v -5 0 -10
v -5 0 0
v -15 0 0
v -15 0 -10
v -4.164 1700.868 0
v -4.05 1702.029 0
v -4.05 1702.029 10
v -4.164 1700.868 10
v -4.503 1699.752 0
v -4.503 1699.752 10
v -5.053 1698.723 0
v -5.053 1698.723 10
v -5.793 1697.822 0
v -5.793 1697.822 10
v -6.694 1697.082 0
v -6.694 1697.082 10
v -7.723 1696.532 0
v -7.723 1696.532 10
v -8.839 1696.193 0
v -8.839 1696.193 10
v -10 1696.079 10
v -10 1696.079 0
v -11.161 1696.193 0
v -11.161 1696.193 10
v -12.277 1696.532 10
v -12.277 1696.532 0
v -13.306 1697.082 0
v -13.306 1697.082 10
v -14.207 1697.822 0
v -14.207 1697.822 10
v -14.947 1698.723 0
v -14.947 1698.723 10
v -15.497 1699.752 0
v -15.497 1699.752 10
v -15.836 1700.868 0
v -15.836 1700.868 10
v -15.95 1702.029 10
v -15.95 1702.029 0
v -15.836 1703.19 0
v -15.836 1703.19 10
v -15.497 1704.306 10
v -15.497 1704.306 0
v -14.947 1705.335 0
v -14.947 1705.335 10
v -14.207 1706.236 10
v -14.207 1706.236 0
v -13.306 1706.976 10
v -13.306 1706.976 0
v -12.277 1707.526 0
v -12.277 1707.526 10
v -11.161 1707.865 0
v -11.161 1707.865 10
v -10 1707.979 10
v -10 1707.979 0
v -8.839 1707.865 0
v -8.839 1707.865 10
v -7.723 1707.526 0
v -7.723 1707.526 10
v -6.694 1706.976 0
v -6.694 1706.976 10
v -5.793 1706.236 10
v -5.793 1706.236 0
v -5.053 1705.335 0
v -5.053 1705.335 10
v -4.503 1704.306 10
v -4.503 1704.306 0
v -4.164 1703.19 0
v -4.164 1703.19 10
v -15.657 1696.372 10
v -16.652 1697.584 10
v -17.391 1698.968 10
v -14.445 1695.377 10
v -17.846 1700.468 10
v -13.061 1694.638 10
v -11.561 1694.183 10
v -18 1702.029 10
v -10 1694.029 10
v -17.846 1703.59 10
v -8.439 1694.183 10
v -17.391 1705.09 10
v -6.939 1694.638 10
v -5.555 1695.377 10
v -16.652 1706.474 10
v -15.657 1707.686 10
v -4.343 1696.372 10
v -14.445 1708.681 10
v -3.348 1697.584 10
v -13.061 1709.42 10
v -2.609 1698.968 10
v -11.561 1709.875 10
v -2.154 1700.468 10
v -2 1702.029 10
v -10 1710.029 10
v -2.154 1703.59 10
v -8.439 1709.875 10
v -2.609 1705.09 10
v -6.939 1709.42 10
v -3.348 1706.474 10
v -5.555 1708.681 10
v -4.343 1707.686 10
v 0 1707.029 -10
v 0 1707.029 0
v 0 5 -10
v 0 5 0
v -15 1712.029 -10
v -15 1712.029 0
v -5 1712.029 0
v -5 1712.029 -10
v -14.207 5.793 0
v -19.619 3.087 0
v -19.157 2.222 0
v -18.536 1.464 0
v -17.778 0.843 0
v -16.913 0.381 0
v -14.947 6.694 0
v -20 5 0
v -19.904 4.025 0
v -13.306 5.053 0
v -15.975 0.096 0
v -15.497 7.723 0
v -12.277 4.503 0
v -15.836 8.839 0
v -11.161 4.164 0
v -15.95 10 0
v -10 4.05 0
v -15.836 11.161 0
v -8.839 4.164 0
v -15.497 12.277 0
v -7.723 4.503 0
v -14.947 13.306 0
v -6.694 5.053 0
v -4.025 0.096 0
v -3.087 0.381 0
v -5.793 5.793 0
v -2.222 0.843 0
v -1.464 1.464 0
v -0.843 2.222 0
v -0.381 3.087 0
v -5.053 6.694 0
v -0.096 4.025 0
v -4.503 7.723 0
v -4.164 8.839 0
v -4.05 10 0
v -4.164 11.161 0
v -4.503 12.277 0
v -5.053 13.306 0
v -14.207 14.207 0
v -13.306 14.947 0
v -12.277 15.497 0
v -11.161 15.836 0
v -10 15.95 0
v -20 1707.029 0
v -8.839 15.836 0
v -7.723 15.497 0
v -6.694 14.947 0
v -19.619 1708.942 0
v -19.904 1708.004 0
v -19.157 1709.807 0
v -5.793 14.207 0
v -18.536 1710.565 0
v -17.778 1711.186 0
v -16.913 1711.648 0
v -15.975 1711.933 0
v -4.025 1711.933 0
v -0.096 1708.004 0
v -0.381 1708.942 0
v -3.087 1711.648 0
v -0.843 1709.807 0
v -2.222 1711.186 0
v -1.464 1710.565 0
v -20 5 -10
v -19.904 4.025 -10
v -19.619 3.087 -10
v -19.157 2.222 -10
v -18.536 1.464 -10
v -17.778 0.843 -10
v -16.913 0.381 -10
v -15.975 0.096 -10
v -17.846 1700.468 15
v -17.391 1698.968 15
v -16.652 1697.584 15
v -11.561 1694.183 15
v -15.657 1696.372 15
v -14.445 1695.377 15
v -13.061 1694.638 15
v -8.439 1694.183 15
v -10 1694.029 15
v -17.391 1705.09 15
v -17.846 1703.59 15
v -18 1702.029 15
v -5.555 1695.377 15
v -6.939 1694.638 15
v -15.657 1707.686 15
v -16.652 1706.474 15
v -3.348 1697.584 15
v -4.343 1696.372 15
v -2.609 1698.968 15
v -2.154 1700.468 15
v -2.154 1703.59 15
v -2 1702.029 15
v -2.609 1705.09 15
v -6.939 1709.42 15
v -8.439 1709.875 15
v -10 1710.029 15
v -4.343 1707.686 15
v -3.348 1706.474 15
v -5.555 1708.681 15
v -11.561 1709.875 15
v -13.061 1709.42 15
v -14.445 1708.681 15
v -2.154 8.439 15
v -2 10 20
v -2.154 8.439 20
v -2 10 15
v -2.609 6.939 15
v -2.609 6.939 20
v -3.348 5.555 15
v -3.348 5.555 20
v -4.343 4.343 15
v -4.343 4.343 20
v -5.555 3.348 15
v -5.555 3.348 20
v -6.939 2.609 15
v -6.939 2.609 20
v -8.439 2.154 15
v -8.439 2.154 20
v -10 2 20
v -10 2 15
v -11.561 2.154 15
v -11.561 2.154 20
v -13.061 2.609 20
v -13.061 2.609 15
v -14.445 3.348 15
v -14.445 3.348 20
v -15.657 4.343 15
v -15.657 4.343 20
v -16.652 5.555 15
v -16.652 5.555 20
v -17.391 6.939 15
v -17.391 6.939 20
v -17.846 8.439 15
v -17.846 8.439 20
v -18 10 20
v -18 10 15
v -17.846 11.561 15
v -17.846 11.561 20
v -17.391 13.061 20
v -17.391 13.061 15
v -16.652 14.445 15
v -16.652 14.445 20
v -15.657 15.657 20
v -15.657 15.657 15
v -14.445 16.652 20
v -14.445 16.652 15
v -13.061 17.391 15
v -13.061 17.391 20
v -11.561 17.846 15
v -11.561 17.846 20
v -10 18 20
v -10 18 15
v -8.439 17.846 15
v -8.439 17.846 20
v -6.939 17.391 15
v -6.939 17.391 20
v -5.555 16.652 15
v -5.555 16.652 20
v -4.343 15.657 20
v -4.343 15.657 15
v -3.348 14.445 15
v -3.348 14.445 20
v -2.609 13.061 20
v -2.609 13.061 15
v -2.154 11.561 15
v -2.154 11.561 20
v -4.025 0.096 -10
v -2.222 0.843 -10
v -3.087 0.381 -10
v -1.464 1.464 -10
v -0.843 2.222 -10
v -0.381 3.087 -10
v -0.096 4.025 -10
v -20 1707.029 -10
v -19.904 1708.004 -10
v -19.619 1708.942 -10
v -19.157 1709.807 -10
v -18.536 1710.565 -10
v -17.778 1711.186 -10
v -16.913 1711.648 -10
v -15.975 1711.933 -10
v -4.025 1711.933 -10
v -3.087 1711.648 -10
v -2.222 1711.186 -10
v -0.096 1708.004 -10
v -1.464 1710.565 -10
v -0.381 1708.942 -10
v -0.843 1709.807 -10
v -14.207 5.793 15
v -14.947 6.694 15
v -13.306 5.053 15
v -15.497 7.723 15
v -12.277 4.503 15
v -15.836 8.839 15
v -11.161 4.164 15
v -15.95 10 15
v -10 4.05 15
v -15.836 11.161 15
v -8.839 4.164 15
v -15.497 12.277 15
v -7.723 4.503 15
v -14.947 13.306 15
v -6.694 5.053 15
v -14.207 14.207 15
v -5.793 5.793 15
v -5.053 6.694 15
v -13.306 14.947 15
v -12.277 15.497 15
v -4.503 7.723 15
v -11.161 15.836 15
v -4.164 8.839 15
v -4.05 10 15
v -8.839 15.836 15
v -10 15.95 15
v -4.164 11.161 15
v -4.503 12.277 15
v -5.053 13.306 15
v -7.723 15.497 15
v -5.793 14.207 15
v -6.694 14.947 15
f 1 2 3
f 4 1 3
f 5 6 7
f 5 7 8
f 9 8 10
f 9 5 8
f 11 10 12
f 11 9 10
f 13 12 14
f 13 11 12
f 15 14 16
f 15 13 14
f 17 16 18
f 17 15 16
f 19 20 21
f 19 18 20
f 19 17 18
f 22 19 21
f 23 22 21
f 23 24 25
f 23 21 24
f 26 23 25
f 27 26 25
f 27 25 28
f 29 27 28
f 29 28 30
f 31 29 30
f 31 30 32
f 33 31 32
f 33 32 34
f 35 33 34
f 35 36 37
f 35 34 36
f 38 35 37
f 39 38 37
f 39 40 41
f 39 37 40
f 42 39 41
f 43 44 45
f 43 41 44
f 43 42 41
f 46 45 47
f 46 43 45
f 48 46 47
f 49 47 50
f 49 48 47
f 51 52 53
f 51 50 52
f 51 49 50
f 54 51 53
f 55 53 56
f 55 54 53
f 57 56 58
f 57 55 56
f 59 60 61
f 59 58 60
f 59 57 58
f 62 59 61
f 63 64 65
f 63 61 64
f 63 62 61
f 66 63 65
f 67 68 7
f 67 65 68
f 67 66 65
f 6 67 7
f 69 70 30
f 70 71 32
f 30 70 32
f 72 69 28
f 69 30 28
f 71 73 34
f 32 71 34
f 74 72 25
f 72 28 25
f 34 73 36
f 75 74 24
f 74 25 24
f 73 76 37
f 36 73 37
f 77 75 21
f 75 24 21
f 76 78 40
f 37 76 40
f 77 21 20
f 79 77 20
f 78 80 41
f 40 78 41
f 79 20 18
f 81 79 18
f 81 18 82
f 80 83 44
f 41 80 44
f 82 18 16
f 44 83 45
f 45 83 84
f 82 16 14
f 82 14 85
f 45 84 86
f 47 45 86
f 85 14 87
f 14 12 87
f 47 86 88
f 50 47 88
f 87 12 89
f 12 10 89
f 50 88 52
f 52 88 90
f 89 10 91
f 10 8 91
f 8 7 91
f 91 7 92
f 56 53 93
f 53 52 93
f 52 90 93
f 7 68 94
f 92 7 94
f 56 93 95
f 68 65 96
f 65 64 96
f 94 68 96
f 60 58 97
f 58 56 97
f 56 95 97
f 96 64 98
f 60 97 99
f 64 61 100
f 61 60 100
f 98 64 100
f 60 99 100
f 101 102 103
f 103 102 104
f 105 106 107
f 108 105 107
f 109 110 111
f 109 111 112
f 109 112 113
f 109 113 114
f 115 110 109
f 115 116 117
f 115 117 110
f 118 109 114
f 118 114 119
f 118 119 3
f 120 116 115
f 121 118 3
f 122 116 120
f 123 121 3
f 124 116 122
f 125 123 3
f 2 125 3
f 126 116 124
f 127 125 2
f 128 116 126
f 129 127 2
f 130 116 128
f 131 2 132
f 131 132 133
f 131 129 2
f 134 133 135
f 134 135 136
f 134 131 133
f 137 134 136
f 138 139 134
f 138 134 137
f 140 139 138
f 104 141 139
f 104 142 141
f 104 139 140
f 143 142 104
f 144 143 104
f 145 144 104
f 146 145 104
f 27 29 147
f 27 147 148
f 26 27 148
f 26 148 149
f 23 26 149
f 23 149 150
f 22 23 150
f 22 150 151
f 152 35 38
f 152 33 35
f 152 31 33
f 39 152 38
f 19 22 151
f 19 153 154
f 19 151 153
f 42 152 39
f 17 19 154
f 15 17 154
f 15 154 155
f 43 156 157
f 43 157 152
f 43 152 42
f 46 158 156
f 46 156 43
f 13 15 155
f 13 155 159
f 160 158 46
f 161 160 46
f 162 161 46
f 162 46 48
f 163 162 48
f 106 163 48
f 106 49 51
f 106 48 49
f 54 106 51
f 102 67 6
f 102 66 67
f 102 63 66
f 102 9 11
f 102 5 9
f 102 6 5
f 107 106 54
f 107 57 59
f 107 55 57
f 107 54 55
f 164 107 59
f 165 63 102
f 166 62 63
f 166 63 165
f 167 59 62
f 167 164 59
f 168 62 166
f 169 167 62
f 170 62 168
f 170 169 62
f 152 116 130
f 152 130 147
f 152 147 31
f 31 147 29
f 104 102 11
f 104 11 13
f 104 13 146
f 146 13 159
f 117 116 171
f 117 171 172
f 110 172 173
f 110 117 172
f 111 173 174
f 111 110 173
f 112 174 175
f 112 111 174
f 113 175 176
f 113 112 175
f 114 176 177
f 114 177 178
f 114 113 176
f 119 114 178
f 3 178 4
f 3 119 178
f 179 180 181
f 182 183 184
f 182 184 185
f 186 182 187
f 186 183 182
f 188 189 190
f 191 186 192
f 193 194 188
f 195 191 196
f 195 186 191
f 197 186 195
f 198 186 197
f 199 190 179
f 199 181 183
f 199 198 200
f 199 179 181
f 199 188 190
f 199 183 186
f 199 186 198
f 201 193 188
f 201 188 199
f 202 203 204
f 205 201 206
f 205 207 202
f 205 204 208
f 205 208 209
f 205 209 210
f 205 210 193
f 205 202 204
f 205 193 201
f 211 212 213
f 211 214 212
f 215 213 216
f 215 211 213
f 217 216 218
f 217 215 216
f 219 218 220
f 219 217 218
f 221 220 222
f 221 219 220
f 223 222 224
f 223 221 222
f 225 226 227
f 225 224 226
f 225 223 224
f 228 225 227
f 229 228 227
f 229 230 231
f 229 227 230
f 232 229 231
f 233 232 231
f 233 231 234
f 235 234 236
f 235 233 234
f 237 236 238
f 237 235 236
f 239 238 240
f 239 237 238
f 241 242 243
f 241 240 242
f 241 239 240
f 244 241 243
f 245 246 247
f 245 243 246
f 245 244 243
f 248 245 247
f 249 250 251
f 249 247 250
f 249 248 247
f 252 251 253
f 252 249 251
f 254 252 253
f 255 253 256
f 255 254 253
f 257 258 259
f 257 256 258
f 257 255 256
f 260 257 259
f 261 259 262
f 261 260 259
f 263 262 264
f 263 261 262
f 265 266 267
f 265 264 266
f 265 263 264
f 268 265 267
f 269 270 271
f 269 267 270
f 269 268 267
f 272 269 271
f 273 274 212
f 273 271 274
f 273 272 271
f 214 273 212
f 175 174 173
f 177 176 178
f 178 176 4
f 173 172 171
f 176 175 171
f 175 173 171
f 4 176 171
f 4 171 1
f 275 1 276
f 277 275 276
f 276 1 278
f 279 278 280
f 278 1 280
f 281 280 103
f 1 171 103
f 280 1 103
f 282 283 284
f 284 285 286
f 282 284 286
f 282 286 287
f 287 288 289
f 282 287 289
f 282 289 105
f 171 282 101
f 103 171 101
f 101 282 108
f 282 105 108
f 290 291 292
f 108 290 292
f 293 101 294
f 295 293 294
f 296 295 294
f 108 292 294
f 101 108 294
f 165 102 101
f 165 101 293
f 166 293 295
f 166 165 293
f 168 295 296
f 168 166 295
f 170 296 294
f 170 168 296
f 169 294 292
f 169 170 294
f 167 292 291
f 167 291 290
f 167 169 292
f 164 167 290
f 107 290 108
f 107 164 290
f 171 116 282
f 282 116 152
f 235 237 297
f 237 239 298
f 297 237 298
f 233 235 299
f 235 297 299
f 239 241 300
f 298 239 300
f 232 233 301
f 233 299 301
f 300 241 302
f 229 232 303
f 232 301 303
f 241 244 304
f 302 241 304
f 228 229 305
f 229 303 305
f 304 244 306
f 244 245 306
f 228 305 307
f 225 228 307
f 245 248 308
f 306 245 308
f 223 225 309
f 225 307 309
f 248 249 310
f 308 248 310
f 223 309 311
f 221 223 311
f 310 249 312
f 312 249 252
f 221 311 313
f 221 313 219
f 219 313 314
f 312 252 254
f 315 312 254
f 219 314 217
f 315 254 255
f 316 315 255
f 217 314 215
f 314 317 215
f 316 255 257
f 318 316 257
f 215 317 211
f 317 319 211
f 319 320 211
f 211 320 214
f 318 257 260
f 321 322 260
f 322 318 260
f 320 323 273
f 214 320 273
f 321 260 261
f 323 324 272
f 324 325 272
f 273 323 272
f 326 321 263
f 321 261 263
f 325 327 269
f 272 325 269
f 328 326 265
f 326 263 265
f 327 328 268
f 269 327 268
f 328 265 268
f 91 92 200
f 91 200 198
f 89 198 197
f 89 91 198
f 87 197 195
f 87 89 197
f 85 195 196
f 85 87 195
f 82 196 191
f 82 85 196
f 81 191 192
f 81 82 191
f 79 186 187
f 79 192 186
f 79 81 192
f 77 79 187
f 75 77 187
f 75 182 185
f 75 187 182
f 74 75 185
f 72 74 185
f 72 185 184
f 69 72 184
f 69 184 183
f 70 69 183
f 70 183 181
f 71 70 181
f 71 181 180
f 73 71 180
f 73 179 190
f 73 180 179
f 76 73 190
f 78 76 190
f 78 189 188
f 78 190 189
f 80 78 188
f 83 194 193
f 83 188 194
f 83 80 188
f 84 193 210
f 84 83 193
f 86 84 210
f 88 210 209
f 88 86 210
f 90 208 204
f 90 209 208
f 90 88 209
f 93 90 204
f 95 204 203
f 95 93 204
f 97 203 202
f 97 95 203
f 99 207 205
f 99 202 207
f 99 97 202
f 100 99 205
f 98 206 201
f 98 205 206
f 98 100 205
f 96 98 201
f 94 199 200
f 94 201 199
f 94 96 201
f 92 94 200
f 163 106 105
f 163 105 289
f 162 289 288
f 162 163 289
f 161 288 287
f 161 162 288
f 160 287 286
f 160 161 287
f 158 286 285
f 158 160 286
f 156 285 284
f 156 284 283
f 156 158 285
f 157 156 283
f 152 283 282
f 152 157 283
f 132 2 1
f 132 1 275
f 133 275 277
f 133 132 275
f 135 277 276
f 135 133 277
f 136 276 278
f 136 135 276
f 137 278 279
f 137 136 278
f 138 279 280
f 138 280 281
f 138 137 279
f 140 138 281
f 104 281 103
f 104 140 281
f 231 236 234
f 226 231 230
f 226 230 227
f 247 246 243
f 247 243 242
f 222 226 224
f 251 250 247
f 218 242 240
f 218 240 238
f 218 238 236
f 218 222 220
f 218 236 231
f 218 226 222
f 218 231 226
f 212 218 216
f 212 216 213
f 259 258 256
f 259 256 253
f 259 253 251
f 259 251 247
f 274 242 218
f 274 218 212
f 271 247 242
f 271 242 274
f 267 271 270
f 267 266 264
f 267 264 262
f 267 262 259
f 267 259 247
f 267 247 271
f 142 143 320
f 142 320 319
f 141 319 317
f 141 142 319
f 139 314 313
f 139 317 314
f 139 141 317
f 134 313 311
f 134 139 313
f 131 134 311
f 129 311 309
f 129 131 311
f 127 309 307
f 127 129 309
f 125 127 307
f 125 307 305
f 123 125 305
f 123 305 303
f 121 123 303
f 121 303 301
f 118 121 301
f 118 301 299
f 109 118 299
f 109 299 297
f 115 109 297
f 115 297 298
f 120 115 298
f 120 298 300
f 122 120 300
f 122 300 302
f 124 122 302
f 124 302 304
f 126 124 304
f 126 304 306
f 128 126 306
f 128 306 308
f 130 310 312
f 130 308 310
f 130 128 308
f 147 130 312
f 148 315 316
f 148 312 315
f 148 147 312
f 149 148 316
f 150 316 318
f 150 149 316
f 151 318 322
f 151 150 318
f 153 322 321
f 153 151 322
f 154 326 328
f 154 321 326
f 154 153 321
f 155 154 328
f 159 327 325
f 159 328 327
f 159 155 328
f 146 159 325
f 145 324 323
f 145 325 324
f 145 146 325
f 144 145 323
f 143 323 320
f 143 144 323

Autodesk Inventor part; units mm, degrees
ref_plane "YZ Plane" through (0, 0, 0) normal (1, 0, 0) x (0, 1, 0)
ref_plane "XZ Plane" through (0, 0, 0) normal (0, 1, 0) x (-1, 0, 0)
ref_plane "XY Plane" through (0, 0, 0) normal (0, 0, 1) x (1, 0, 0)
sketch "Skizze1" plane through (0, 0, 0) normal (0, 0, 1) x (1, 0, 0)
  line L0 (-15, 1712.029) -> (-5, 1712.029)
  line L1 (0, 1707.029) -> (0, 5)
  line L2 (-5, 0) -> (-15, 0)
  line L3 (-20, 5) -> (-20, 1707.029)
  circle A0 centre (-10, 10) radius 5.95
  circle A1 centre (-10, 1702.029) radius 5.95
  arc A2 (-15, 1712.029) -> (-20, 1707.029) centre (-15, 1707.029) ccw
  arc A3 (0, 1707.029) -> (-5, 1712.029) centre (-5, 1707.029) ccw
  arc A4 (-20, 5) -> (-15, 0) centre (-15, 5) ccw
  arc A5 (-5, 0) -> (0, 5) centre (-5, 5) ccw
  point P0 (0, 0)
  point P1 (-20, 1712.029)
  point P2 (0, 1712.029)
  dimension "d0" = 20
  dimension "d2" = 11.9
  dimension "d3" = 10
  dimension "d4" = 10
  dimension "d5" = 11.9
  dimension "d6" = 10
  dimension "d7" = 1692.029
  dimension "d8" = 10
  dimension "d9" = 5
extrude "Extrusion1" add sketch "Skizze1" against normal blind 10 contours L0 A3 L1 A5 L2 A4 L3 A2 | A0 | A1
extrude "Extrusion2" add sketch "Skizze1" along normal blind 10 contours A1
sketch "Skizze2" plane through (-10, 1702.029, 10) normal (0, 0, 1) x (1, 0, 0)
  circle A0 centre (0, 0) radius 8
  point P0 (10, -1702.029)
  dimension "d14" = 16
extrude "Extrusion3" add sketch "Skizze2" along normal blind 5
extrude "Extrusion4" add sketch "Skizze1" along normal blind 15 contours A0
sketch "Skizze3" plane through (-10, 10, 15) normal (0, 0, 1) x (1, 0, 0)
  circle A0 centre (0, 0) radius 8
  point P0 (10, -10)
  dimension "d19" = 16
extrude "Extrusion5" add sketch "Skizze3" along normal blind 5
properties part number "Lenkung_verbindung"
